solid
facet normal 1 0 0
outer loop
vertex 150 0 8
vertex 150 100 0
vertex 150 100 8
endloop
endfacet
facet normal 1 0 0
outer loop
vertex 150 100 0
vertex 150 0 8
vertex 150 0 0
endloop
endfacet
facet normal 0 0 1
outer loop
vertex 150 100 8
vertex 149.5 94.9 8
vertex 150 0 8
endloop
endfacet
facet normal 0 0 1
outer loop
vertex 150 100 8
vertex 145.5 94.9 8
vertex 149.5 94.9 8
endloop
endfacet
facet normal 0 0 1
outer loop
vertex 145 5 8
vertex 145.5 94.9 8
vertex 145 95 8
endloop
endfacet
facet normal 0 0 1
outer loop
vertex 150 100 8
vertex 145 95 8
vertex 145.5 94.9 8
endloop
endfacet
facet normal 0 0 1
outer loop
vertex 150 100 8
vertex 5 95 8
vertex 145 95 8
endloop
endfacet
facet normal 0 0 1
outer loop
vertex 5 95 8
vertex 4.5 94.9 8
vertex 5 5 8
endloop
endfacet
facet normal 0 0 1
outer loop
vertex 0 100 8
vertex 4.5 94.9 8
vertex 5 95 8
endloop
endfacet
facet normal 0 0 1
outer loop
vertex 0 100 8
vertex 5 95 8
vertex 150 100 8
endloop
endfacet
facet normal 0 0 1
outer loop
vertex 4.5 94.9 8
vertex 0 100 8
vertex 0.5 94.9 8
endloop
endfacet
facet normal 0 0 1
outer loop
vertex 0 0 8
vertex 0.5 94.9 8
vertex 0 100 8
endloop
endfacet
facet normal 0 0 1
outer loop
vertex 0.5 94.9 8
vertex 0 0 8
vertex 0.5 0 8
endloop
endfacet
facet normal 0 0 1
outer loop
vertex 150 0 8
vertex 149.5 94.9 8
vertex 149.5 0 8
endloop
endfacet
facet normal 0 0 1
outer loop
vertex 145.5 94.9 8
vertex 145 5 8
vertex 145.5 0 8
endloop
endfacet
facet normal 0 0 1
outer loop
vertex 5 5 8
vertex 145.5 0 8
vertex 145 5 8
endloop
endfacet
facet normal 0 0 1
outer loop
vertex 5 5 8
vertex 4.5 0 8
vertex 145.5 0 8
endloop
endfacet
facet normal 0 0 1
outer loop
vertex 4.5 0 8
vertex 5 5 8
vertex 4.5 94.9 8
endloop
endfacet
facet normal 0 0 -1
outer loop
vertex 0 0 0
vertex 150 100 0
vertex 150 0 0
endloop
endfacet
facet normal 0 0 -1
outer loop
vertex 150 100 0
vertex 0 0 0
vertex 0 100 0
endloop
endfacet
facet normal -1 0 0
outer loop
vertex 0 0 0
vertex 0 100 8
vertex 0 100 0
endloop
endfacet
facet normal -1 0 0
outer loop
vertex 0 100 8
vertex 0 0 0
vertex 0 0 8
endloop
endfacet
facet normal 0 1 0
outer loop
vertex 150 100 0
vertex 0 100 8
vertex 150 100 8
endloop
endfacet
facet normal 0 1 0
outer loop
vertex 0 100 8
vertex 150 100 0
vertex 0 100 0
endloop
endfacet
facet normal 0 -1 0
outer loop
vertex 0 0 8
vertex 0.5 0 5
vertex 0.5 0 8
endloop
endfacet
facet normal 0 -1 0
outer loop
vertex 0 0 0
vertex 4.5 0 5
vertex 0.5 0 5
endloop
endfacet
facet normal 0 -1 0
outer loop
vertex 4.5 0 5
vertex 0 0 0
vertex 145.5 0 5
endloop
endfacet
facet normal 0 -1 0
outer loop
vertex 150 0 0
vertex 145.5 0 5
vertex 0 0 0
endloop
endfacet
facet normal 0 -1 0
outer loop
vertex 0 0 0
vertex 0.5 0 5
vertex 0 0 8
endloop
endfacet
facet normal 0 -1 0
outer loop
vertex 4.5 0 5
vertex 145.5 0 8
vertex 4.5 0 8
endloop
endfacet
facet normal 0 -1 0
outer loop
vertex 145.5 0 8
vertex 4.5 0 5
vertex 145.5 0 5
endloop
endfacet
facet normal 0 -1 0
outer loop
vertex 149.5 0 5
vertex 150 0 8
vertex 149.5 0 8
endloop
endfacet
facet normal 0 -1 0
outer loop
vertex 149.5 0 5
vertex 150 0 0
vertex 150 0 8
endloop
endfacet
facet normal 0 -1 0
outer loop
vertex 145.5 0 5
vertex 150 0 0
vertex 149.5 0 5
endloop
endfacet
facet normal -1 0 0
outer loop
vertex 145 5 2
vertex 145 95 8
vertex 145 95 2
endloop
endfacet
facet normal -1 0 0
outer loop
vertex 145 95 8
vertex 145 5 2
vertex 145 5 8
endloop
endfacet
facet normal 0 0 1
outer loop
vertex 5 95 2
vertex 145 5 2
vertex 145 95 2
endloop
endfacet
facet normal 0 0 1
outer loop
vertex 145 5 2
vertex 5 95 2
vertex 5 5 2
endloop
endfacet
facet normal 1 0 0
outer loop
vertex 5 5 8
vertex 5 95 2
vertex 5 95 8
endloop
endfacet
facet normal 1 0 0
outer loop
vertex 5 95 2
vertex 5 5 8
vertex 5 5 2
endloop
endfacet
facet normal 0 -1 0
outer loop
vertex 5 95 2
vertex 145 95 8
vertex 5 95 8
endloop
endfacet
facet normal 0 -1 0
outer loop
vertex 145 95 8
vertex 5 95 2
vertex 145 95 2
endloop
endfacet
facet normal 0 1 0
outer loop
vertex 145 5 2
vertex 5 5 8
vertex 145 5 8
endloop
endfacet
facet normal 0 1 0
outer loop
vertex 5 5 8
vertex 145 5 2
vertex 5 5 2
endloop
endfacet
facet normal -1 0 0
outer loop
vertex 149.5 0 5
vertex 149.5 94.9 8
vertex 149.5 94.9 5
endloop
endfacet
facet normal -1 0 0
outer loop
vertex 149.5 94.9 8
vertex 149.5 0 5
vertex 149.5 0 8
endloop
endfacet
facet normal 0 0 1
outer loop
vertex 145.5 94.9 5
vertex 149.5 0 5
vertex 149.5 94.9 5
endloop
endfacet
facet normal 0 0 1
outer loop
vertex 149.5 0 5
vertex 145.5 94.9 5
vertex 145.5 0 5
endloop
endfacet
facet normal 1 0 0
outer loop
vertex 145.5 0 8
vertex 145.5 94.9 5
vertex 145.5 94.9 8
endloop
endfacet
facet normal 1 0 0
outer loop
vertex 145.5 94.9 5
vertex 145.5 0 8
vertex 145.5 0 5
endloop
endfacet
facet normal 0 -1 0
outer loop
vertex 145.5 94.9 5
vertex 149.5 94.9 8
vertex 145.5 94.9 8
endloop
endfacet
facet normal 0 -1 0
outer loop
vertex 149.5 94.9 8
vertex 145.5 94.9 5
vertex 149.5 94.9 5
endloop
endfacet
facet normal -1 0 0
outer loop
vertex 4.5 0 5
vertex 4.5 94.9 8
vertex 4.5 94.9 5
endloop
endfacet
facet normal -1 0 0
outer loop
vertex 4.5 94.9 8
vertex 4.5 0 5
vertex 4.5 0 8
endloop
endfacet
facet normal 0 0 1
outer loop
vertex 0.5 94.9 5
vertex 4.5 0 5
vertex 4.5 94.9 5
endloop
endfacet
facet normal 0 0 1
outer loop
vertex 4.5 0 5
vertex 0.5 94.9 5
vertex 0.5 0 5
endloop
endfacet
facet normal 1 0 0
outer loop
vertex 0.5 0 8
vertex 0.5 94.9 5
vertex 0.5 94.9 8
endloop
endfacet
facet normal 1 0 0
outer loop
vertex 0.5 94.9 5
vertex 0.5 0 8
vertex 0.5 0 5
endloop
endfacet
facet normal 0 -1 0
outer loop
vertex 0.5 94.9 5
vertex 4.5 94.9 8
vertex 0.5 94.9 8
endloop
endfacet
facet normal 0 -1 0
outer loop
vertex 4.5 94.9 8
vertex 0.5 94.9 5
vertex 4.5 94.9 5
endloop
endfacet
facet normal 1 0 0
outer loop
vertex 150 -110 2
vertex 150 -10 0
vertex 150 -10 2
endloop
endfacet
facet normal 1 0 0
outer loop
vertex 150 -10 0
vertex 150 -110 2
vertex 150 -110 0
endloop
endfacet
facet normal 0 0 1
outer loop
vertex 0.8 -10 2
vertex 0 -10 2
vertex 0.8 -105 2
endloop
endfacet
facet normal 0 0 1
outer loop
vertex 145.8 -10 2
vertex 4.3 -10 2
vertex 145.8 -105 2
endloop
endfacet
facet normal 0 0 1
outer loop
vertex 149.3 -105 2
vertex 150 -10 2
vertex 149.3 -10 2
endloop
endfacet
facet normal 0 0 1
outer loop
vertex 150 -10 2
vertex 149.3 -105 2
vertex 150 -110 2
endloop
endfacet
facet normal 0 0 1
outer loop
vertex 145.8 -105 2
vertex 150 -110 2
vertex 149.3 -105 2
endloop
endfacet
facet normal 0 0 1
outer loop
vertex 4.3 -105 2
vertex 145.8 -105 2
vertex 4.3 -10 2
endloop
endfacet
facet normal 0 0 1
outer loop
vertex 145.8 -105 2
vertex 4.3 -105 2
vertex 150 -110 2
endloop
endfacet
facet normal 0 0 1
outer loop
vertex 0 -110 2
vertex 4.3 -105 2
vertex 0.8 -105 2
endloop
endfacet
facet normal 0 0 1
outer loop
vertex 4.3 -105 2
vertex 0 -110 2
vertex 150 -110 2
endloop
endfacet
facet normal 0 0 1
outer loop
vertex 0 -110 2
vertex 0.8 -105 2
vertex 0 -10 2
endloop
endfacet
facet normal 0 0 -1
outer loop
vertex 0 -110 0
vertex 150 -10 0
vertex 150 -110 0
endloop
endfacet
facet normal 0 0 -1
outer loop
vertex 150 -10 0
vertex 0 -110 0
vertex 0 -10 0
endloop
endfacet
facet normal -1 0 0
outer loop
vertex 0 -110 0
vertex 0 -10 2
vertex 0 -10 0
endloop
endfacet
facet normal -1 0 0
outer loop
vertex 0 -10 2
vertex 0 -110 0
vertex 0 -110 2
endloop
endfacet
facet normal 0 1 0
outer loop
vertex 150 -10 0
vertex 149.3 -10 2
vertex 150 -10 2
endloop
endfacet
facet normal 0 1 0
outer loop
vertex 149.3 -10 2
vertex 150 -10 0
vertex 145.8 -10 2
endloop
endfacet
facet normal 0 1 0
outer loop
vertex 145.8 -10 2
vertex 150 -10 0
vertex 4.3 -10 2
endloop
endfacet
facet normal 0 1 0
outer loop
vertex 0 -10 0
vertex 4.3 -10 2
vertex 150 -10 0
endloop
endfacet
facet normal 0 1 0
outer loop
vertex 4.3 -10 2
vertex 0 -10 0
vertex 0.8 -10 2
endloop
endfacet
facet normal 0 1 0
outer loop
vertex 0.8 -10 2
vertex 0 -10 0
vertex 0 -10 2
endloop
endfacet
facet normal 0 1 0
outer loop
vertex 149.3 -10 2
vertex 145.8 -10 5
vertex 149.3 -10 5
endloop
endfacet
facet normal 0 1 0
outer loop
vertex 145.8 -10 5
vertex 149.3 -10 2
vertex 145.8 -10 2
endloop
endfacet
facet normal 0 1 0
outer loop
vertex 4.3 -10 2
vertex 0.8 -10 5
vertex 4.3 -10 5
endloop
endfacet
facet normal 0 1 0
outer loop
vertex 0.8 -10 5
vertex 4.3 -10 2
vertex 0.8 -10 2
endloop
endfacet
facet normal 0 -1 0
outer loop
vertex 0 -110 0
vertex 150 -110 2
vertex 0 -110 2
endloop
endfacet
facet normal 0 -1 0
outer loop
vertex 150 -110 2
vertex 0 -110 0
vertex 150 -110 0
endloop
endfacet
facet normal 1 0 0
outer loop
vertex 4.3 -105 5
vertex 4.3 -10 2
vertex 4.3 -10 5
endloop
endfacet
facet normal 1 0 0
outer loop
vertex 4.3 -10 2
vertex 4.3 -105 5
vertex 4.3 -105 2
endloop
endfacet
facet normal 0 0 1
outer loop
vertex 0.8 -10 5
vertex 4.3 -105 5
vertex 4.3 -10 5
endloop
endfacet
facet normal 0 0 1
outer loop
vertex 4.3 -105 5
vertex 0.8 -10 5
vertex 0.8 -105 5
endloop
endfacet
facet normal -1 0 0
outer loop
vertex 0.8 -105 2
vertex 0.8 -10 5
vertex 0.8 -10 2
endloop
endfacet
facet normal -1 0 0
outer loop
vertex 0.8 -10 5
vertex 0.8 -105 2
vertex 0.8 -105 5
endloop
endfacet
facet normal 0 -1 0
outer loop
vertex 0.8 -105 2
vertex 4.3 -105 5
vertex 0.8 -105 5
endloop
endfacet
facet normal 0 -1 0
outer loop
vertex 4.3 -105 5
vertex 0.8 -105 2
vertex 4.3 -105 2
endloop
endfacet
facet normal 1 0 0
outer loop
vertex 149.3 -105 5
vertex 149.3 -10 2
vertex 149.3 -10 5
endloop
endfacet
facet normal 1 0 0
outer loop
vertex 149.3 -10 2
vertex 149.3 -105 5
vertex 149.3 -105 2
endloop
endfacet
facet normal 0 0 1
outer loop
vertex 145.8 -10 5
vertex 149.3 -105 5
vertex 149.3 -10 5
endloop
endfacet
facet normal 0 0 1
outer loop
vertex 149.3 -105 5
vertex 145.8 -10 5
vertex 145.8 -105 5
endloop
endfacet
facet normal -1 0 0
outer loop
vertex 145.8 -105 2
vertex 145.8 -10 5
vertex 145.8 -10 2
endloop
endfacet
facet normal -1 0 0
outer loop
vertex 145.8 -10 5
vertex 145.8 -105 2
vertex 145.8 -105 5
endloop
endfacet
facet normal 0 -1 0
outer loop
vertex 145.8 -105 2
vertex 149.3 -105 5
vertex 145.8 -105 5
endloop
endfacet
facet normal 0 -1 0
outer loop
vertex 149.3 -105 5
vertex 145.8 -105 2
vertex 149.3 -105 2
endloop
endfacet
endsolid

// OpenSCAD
//коробка
difference () {
cube ([150,100,8]);
translate ([5,5,2])cube ([140,90,6.1]);
translate ([145.5,-0.1,5])cube ([4,95,4]);
translate ([0.5,-0.1,5])cube ([4,95,4]);
}

//крышка
translate ([0,-110 ,-4]) {
translate ([0,0,4])cube ([150,100,2]);
translate ([0.8,5,5])cube ([3.5,95,4]);
translate ([145.8,5,5])cube ([3.5,95,4]);
}
